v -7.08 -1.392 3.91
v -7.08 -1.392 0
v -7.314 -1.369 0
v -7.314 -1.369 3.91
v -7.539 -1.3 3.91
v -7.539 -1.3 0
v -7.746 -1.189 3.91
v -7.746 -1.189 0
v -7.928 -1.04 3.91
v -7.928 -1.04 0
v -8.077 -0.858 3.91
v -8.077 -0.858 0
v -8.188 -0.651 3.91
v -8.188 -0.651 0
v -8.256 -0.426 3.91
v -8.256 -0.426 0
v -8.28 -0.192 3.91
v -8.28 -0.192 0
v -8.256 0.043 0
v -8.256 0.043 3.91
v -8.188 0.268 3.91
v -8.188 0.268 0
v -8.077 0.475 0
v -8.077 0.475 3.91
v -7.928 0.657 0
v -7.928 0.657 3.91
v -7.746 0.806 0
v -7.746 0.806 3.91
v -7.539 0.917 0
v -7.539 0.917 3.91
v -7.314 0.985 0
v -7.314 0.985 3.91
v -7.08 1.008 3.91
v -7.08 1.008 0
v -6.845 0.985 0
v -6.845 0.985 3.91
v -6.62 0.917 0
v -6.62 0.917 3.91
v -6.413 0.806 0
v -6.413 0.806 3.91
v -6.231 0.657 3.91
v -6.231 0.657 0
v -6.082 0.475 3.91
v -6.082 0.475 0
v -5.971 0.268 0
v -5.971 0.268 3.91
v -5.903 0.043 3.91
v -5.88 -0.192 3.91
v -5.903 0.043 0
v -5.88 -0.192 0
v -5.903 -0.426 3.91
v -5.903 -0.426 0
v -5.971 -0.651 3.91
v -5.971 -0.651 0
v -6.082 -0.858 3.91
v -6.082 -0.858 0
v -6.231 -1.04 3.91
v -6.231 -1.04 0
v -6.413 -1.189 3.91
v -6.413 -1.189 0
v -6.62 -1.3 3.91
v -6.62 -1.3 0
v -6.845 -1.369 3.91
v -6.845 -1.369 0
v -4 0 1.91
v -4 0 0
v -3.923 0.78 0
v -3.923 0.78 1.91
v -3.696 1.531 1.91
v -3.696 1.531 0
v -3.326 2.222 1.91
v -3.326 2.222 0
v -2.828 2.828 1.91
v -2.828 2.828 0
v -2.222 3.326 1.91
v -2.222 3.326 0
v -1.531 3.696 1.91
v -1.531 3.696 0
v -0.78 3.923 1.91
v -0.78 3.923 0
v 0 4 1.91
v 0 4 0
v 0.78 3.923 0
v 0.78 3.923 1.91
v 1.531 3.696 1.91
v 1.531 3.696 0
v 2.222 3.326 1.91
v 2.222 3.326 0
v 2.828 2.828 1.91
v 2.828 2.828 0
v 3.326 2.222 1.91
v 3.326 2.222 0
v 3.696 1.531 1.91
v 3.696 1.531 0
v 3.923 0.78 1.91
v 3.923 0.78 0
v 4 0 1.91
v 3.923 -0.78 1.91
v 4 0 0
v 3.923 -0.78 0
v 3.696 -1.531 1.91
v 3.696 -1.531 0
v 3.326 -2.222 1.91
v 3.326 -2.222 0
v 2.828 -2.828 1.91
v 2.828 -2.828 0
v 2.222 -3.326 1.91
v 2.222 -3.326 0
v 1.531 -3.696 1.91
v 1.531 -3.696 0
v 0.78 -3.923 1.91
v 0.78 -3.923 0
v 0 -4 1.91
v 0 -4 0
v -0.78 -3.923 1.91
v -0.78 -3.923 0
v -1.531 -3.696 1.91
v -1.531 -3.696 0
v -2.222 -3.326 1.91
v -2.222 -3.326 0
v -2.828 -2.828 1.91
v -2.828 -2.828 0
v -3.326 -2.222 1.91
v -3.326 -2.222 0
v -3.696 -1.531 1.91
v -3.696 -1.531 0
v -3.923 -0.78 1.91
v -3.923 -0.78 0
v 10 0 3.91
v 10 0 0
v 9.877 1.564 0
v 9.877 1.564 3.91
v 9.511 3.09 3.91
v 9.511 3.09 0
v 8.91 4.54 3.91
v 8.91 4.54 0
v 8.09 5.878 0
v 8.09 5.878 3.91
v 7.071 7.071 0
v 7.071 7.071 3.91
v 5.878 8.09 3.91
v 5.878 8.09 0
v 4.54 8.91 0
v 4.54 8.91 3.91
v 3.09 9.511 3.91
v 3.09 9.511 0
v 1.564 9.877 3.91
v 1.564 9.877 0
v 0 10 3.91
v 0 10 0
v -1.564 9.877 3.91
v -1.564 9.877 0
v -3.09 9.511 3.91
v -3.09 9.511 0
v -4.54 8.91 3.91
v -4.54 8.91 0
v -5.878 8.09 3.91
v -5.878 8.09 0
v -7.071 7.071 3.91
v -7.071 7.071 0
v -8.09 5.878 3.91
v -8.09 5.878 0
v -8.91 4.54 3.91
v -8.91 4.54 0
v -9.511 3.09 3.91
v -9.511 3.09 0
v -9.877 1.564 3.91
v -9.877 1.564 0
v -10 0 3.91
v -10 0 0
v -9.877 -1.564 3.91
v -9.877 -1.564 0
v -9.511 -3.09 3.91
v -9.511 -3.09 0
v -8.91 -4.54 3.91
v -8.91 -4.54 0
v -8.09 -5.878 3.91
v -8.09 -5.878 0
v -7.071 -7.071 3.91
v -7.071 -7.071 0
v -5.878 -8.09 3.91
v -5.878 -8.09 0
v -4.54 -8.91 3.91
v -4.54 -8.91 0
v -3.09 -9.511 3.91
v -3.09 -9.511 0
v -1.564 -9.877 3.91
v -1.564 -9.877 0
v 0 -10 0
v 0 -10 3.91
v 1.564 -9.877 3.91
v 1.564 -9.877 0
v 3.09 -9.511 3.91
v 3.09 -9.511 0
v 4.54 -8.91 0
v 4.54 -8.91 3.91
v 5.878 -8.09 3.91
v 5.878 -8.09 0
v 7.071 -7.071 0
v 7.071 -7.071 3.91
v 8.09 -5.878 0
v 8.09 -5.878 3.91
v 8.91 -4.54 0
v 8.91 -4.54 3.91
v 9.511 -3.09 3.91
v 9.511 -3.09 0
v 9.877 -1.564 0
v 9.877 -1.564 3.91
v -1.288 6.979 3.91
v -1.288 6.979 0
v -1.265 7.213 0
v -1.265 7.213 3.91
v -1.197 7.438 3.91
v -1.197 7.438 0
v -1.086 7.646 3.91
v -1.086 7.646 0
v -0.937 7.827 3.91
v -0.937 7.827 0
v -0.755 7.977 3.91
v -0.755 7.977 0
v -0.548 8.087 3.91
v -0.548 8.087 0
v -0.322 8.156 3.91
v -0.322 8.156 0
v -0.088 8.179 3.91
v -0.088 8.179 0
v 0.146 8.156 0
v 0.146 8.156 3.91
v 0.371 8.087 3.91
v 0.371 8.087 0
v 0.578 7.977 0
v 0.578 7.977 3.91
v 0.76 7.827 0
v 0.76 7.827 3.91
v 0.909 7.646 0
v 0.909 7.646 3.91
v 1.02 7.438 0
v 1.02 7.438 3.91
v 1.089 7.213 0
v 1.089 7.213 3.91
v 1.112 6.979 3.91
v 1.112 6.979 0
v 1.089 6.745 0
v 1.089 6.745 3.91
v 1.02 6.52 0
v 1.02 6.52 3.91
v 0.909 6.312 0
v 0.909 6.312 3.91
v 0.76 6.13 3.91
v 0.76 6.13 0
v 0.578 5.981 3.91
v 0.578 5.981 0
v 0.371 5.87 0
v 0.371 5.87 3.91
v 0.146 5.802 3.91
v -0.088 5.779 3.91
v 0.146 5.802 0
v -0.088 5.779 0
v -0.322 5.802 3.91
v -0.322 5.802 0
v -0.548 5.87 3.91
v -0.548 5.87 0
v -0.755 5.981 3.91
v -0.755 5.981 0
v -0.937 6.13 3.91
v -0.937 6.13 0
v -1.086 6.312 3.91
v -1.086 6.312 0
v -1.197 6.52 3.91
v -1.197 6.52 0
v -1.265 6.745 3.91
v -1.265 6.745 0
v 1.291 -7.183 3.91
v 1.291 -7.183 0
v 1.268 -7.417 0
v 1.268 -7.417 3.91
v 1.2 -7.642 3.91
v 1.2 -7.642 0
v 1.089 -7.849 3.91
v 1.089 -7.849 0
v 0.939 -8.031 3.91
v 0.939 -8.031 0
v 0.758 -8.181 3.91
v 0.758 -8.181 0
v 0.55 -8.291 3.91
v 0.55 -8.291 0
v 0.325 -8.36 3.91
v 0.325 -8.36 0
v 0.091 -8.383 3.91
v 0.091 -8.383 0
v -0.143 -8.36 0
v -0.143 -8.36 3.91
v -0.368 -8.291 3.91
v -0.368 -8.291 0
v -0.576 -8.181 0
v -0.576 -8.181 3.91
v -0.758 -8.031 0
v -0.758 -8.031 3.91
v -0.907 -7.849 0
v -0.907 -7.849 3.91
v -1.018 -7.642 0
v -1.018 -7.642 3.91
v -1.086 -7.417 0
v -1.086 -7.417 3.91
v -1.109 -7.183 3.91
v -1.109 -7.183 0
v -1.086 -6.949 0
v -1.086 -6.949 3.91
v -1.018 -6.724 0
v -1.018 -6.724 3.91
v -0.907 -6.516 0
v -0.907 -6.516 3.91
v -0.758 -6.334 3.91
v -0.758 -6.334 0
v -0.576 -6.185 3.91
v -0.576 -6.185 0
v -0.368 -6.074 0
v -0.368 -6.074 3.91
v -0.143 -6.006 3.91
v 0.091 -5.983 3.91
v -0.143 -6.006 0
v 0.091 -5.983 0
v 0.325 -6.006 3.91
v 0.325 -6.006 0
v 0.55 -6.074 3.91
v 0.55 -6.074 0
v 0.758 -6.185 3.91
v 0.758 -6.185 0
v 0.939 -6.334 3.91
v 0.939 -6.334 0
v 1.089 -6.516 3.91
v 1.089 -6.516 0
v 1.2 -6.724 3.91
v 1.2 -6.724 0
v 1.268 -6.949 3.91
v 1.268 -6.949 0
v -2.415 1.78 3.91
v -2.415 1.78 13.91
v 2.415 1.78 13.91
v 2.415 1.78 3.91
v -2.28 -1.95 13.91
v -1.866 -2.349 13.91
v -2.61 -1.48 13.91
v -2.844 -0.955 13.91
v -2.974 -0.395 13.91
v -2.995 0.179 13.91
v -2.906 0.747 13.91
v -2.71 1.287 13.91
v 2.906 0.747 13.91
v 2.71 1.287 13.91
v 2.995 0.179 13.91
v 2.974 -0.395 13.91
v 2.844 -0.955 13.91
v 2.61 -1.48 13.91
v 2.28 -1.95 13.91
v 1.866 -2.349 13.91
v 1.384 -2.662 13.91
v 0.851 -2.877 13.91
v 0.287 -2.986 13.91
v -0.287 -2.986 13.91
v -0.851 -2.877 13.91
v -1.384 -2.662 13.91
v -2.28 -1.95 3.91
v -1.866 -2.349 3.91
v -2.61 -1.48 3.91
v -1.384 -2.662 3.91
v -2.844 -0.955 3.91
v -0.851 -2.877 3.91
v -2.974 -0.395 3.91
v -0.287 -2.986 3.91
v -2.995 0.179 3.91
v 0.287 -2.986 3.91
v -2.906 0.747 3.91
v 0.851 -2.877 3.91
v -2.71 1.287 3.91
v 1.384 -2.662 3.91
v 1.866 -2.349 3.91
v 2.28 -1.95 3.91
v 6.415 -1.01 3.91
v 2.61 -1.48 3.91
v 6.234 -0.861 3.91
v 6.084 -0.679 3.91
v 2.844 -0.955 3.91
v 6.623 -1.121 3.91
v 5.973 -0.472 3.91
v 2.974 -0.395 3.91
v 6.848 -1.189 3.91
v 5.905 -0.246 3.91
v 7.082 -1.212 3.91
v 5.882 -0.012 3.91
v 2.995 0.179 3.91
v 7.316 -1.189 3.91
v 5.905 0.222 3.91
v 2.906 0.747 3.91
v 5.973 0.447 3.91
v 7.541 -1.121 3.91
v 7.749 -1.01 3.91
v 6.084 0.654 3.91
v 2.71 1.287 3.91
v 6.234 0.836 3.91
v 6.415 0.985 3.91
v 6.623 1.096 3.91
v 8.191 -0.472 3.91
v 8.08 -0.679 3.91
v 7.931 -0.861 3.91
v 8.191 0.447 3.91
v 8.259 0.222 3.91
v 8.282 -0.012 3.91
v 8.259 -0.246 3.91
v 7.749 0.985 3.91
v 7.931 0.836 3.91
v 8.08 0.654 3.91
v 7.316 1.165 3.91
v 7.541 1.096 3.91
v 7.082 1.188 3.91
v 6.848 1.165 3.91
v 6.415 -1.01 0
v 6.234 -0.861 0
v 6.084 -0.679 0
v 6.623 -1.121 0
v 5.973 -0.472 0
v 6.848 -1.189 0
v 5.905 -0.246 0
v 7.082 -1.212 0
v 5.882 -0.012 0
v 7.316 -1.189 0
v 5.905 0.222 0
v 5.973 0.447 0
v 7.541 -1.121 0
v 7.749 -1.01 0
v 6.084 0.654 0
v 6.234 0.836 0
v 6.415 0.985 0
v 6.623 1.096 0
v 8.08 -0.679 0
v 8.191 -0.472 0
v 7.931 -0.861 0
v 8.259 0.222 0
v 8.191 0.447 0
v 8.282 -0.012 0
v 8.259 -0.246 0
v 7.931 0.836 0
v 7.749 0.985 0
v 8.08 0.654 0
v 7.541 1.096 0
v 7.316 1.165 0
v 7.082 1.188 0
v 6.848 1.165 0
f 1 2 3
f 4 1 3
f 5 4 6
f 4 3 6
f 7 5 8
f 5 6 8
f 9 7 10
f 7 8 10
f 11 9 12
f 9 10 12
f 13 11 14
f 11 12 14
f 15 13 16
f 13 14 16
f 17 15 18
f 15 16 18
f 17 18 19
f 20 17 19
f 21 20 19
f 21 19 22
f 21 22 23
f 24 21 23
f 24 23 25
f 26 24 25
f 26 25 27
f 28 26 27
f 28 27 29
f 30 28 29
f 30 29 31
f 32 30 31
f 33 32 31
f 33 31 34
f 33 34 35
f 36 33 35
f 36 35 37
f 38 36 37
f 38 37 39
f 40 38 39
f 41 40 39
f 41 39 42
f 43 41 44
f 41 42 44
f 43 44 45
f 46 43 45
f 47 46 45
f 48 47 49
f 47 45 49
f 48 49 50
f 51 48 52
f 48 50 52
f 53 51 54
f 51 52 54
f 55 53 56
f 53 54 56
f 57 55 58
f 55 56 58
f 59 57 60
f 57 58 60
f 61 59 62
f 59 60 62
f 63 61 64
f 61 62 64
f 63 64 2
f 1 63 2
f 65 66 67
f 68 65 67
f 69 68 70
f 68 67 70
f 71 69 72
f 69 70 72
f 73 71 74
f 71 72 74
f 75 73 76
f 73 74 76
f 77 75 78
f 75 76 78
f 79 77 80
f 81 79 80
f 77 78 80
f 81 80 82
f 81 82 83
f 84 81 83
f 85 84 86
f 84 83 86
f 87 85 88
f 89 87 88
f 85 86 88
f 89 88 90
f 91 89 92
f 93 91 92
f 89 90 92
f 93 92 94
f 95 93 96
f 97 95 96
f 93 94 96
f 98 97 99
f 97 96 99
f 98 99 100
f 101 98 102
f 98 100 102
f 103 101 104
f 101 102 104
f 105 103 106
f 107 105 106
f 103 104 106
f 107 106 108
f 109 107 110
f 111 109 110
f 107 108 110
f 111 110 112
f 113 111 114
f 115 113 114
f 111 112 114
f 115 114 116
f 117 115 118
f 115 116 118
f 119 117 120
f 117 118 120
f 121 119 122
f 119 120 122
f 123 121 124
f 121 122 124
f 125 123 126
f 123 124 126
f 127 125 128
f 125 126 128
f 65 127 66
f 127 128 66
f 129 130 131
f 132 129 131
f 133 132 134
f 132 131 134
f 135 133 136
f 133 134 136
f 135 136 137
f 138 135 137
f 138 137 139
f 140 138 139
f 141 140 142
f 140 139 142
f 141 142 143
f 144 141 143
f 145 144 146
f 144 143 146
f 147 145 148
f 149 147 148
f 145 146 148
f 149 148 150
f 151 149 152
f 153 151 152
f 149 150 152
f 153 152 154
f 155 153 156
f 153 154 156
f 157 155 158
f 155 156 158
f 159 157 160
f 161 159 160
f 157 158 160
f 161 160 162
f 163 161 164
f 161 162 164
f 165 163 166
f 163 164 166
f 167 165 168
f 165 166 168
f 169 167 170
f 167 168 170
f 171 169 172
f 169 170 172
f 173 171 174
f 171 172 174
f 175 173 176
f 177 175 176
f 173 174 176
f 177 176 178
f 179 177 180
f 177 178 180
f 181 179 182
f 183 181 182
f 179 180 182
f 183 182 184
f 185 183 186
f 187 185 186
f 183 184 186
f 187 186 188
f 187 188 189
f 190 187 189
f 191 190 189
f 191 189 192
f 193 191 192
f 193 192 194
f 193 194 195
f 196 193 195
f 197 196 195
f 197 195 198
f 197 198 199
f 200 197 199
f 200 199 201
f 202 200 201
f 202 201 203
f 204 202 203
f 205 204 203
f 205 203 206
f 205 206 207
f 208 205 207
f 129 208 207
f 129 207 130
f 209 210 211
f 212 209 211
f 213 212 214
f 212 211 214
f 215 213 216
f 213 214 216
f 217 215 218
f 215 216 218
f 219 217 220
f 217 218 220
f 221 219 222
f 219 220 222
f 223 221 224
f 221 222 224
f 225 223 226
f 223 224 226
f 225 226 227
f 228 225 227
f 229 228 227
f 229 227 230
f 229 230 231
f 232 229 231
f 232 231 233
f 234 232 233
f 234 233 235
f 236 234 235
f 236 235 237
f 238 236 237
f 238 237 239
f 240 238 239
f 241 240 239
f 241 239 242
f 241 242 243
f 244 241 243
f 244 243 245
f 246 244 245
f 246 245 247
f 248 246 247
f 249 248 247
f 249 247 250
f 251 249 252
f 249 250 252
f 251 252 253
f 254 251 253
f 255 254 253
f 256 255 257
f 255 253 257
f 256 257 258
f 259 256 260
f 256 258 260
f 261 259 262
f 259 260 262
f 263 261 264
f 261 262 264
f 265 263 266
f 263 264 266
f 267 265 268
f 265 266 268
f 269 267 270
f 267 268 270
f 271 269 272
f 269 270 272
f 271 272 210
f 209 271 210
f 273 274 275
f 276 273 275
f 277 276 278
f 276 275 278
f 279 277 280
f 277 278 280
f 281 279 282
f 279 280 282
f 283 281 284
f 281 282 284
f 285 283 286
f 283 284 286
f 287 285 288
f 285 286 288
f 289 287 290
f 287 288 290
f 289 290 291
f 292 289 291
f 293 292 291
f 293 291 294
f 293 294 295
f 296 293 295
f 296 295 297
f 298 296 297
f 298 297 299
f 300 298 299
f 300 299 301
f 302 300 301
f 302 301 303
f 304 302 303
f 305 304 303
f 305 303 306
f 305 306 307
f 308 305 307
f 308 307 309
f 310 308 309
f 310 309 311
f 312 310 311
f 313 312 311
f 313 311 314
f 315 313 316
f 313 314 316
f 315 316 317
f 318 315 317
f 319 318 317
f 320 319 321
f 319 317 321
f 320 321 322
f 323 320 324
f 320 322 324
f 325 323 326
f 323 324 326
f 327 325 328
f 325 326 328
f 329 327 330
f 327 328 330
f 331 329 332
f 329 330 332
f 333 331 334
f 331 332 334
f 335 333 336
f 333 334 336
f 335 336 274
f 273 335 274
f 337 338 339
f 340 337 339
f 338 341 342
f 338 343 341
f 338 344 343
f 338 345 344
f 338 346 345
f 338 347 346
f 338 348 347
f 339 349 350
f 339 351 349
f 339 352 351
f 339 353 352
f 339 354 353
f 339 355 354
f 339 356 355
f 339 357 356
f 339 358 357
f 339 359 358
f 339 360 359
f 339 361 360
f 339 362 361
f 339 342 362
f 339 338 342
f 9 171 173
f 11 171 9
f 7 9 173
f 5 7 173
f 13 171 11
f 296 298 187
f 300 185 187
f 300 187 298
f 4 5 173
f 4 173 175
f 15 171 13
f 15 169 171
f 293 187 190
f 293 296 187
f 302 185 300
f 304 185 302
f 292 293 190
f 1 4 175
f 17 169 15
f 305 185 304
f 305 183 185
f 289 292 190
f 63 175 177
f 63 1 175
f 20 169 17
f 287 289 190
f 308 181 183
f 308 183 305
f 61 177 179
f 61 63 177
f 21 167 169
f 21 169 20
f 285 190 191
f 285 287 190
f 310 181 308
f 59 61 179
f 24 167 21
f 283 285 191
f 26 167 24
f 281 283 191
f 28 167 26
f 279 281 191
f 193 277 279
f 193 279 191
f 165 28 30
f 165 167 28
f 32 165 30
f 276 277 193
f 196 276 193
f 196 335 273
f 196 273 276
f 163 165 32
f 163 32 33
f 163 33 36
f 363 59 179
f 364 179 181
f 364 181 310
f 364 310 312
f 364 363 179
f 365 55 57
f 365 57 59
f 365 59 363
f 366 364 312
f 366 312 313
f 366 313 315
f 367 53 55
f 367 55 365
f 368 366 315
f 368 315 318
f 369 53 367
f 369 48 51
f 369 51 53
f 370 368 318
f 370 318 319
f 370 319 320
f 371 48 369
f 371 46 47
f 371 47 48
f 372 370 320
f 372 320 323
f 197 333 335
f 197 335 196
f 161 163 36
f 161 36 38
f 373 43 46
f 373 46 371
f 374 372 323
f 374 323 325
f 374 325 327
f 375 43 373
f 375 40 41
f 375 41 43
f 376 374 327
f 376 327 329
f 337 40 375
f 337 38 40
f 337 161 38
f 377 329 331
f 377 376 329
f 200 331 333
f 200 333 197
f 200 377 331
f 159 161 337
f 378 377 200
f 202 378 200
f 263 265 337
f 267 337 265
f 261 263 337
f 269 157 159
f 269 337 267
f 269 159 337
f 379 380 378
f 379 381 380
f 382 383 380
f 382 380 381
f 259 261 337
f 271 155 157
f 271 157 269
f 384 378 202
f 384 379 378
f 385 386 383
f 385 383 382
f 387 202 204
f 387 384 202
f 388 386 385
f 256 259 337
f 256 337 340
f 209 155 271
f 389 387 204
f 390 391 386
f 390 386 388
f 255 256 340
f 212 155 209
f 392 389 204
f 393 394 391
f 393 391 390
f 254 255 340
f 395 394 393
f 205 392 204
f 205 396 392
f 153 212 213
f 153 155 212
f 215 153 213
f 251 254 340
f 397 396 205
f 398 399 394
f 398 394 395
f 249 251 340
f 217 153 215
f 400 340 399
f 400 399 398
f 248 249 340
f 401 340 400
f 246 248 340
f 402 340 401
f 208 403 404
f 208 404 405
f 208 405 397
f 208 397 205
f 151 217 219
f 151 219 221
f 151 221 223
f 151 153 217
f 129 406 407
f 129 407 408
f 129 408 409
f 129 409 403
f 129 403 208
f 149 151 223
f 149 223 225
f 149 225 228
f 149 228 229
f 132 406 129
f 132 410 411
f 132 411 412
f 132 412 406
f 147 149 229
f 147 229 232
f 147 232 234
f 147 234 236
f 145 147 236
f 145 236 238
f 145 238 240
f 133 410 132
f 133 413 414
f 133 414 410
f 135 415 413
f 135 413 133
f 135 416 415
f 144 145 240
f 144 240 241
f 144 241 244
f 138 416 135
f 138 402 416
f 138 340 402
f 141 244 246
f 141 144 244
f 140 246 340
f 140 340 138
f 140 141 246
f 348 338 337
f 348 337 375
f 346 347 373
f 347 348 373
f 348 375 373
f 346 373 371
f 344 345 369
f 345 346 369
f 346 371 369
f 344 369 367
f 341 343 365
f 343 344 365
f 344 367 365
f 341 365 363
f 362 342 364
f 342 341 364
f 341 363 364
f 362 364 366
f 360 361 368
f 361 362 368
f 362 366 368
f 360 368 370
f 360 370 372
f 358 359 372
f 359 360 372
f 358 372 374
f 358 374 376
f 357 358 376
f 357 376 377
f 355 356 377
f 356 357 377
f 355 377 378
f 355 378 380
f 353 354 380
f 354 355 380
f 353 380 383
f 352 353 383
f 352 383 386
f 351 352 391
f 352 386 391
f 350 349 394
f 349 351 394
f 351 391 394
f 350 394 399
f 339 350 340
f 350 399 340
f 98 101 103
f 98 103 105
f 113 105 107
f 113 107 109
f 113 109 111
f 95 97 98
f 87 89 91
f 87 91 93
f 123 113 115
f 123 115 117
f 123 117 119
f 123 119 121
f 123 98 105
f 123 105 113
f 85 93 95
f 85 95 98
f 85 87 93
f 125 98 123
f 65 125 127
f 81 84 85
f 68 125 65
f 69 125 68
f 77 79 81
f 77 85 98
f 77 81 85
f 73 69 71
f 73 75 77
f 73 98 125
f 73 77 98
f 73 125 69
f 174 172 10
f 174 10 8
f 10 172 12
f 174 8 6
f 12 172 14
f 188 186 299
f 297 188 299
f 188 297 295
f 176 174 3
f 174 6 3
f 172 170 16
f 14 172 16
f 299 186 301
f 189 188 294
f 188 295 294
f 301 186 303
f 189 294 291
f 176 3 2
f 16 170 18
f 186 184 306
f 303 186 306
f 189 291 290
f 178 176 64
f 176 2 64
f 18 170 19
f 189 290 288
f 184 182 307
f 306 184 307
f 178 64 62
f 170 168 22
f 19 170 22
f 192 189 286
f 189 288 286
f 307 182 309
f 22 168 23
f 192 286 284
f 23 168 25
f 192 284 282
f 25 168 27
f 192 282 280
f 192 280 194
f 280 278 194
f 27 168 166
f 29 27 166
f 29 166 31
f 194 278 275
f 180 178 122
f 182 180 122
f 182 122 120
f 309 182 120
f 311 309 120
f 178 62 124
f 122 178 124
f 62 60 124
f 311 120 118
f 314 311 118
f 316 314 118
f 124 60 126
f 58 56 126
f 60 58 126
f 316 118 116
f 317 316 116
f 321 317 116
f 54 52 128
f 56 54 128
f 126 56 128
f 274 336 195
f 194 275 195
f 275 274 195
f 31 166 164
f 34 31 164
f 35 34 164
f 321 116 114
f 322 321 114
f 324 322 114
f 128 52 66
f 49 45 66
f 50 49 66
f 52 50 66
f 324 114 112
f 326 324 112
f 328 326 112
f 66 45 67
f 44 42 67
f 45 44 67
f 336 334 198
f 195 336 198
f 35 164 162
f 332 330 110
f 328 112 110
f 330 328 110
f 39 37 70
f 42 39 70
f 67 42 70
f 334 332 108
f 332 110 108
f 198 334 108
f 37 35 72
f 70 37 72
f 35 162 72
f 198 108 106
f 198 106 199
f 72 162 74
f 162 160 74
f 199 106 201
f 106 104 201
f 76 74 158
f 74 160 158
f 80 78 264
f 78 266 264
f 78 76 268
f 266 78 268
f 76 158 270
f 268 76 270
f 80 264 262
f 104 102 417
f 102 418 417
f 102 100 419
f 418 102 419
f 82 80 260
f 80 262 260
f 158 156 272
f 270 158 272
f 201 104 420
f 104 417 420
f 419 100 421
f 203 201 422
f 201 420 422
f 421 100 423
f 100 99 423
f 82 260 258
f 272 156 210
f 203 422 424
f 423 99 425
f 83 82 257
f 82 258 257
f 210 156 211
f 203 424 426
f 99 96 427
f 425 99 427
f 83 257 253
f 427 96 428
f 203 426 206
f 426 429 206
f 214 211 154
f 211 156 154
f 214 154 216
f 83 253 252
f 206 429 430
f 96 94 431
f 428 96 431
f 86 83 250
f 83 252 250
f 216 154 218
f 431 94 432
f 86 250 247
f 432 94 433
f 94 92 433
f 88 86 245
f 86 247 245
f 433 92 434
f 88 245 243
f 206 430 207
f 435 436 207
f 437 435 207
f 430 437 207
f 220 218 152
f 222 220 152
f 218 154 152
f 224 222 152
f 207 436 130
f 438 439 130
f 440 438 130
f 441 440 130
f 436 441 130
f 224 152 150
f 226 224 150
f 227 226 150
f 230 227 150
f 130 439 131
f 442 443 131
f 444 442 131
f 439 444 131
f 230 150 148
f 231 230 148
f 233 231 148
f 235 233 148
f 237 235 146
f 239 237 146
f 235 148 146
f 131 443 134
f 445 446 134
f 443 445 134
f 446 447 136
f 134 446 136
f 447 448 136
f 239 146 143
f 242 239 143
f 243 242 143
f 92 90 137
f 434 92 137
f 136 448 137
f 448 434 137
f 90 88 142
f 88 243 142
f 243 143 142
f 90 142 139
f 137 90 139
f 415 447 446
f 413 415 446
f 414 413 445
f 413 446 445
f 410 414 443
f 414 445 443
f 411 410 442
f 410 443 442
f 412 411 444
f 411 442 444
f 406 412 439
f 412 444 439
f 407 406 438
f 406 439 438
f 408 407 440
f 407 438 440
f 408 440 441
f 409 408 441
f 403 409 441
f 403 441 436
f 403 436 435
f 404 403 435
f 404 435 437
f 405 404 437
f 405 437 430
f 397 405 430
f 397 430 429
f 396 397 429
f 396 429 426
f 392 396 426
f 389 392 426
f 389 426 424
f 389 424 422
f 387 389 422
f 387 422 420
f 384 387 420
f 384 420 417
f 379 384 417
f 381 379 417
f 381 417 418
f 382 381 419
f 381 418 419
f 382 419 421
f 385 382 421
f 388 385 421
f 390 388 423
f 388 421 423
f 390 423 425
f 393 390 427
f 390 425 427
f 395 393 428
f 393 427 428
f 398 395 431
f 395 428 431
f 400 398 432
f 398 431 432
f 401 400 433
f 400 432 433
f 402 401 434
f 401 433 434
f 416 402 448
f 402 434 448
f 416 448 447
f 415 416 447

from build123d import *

# Parameters (mm, degrees)
ESQUISSE1_R                  = 10
BOSS_EXTRU_1_DEPTH           = 3.91
D_GAGEMENT_M21_D             = 2.4
R_P_TITION_CIRCULAIRE1_COUNT = 4
ESQUISSE4_R                  = 3
BOSS_EXTRU_2_DEPTH           = 10
ESQUISSE5_W                  = 6
ESQUISSE5_H                  = 1.22
ENL_V_MAT_EXTRU_1_DEPTH      = 10
ESQUISSE6_R                  = 4
ENL_V_MAT_EXTRU_2_DEPTH      = 1.91


with BuildPart() as part:
    # Esquisse1 → Boss.-Extru.1 (new body)
    with BuildSketch(Plane.XY):
        Circle(ESQUISSE1_R)
    extrude(amount=BOSS_EXTRU_1_DEPTH)

    # Dégagement M21 (through all)
    with Locations(Plane(origin=(-0.088339646, 6.978832002, 3.91), x_dir=(1, 0, 0), z_dir=(0, 0, 1))):
        with Locations((0, 0)):
            d_gagement_m21 = Hole(D_GAGEMENT_M21_D / 2)

    # Répétition circulaire1: Dégagement M21 ×4 about axis
    r_p_tition_circulaire1_axis = Axis((0.001290677, -0.101963455, 0), (0, 0, 1))
    for i in range(1, R_P_TITION_CIRCULAIRE1_COUNT):
        add(d_gagement_m21.rotate(r_p_tition_circulaire1_axis, i * 360 / R_P_TITION_CIRCULAIRE1_COUNT), mode=Mode.SUBTRACT)

    # Esquisse4 → Boss.-Extru.2 (add)
    with BuildSketch(Plane.XY.offset(3.91)):
        Circle(ESQUISSE4_R)
    extrude(amount=BOSS_EXTRU_2_DEPTH)

    # Esquisse5 → Enlèv. mat.-Extru.1 (cut)
    with BuildSketch(Plane.XY.offset(13.91)):
        with Locations((0, 2.39)):
            Rectangle(ESQUISSE5_W, ESQUISSE5_H)
    extrude(amount=-ENL_V_MAT_EXTRU_1_DEPTH, mode=Mode.SUBTRACT)

    # Esquisse6 → Enlèv. mat.-Extru.2 (cut)
    with BuildSketch(Plane(origin=(0, 0, 0), x_dir=(-1, 0, 0), z_dir=(0, 0, -1))):
        Circle(ESQUISSE6_R)
    extrude(amount=-ENL_V_MAT_EXTRU_2_DEPTH, mode=Mode.SUBTRACT)


solid = part.part
